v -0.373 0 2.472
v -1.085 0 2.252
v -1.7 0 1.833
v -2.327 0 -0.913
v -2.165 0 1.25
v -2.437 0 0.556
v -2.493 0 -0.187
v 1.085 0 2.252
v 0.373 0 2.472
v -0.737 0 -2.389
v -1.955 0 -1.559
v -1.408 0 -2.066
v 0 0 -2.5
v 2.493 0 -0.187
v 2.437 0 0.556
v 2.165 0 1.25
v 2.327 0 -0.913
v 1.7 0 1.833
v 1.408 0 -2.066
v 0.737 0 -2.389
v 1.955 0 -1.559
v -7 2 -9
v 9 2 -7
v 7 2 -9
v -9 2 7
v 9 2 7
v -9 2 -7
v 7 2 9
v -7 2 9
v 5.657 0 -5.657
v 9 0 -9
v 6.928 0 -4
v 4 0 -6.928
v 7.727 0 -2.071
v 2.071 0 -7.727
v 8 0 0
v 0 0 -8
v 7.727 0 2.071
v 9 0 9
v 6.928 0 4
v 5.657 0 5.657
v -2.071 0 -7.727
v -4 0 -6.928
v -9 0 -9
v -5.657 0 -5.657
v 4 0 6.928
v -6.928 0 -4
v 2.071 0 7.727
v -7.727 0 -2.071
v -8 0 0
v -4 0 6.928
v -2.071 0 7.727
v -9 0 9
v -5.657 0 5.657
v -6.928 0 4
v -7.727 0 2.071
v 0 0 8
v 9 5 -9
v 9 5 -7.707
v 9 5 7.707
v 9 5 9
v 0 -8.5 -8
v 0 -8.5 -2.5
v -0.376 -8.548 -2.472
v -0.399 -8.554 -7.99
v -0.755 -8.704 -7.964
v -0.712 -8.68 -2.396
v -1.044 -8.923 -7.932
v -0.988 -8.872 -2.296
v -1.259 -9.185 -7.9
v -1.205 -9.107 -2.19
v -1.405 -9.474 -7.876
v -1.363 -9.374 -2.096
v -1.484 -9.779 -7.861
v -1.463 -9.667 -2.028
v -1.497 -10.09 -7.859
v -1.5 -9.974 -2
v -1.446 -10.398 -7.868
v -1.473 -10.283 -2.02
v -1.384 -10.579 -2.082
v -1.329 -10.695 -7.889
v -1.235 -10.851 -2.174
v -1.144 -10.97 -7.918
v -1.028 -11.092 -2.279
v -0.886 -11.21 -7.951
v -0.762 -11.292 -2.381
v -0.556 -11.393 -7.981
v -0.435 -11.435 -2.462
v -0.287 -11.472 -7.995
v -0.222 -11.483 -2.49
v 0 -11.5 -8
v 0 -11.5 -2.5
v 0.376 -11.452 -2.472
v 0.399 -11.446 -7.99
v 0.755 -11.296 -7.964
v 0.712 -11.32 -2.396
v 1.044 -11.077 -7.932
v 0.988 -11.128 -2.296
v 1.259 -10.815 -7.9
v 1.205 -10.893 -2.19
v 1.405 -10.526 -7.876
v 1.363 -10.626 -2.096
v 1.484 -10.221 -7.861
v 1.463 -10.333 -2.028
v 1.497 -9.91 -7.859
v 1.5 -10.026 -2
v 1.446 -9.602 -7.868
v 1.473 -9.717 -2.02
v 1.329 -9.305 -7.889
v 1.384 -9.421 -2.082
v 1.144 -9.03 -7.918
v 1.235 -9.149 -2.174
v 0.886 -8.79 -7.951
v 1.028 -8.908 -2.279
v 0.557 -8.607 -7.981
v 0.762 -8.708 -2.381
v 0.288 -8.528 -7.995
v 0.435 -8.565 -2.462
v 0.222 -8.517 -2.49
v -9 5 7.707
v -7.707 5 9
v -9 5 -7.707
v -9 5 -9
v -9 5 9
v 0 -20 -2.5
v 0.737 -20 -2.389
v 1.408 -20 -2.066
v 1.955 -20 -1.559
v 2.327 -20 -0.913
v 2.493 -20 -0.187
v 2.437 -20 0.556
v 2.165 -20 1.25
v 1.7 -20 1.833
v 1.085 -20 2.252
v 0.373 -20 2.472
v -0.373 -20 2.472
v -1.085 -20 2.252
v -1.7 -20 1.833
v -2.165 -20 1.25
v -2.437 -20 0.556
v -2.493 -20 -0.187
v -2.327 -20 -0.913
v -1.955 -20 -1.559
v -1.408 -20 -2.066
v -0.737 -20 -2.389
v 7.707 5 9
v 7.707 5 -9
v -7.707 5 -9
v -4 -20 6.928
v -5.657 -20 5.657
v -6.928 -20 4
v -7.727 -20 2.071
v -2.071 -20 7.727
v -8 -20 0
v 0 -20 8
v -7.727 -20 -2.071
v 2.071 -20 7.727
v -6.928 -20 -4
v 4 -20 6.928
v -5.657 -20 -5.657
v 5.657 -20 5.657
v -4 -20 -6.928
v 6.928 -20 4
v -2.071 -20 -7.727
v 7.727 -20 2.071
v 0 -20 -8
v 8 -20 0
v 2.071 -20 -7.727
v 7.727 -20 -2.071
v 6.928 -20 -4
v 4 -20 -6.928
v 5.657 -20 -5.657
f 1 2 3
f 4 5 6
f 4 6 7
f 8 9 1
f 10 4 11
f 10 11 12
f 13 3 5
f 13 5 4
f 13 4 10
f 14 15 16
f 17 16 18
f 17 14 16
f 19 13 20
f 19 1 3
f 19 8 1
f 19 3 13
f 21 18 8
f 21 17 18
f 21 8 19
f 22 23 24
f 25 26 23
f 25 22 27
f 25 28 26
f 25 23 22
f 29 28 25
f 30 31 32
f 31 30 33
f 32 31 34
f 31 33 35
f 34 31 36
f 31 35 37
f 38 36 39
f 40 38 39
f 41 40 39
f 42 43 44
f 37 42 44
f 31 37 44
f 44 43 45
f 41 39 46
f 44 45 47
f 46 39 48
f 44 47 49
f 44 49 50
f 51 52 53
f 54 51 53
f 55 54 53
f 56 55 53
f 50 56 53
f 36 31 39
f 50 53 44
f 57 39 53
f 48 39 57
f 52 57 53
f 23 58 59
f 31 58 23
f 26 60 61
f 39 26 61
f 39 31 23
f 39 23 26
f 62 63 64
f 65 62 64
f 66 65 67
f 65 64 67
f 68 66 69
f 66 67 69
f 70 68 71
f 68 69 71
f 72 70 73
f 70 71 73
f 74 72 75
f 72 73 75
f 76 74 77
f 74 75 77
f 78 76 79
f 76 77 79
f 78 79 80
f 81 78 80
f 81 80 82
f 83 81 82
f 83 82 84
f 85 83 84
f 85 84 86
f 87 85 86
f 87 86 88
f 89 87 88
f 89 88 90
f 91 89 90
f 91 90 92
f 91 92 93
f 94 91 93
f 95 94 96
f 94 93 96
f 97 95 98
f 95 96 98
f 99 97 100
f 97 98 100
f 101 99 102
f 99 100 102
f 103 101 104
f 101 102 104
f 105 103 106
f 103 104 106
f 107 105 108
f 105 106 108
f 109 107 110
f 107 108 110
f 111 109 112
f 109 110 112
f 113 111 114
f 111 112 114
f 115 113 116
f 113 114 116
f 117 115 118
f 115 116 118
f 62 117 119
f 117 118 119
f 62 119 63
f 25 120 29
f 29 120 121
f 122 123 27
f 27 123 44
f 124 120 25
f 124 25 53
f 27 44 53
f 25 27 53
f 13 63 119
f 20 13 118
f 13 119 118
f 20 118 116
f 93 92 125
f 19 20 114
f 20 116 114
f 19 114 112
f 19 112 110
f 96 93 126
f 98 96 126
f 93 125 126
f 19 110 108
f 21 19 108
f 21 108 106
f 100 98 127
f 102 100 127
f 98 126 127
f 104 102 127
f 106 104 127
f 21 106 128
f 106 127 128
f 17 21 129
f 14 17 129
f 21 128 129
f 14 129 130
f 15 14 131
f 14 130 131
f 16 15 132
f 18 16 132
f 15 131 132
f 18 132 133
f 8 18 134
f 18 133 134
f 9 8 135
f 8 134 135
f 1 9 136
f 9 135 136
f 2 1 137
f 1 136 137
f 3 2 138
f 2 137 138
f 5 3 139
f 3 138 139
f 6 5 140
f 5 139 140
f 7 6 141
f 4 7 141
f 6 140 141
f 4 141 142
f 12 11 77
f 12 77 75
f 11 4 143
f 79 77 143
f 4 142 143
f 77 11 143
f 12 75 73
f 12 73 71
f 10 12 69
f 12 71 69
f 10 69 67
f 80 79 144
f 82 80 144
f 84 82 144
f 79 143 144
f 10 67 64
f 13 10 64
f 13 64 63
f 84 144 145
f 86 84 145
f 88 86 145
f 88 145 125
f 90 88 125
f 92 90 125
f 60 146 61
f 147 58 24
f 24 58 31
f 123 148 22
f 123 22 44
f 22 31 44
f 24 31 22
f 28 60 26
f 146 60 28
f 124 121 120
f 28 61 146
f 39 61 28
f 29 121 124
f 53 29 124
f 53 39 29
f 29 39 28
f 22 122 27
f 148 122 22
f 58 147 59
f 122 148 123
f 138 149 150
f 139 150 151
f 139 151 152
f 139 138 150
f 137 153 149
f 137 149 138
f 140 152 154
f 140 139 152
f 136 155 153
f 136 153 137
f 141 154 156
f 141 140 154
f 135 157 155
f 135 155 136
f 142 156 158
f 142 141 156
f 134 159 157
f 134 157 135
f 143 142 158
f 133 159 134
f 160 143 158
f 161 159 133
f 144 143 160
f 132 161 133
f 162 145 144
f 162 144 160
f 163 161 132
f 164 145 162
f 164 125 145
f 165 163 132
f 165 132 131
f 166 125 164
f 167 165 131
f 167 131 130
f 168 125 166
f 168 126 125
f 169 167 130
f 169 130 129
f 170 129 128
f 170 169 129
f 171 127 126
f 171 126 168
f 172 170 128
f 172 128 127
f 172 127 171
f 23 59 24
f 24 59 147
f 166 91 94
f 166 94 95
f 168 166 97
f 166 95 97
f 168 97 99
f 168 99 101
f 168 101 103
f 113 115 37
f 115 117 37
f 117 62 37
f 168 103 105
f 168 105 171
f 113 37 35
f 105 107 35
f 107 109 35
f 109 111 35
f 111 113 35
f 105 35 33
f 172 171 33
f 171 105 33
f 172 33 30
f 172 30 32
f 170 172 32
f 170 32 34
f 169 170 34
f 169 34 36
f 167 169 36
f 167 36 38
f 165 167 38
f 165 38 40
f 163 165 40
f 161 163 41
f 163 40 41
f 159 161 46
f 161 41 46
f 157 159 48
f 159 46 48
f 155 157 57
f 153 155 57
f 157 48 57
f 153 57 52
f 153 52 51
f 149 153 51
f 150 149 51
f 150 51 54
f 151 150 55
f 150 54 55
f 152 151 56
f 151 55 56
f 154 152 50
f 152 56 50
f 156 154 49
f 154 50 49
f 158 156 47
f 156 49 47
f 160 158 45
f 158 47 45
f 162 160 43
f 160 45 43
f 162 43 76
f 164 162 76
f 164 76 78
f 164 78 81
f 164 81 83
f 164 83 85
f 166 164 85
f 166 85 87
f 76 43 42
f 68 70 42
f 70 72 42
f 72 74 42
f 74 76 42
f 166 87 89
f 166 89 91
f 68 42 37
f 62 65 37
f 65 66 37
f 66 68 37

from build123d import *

# Parameters (mm, degrees)
SKETCH1_W           = 18
SKETCH1_H           = 18
BOSS_EXTRUDE1_DEPTH = 2
BOSS_EXTRUDE2_DEPTH = 3
CUT_EXTRUDE4_DEPTH  = 3
SKETCH5_R           = 8
BOSS_EXTRUDE3_DEPTH = 20
SKETCH6_R           = 2.5
CUT_EXTRUDE5_DEPTH  = 20
SKETCH7_R           = 1.5
CUT_EXTRUDE6_DEPTH  = 20


# Read off the part's stored shape, not the designer's step: Mirror1, Mirror2
with BuildPart() as part:
    # Sketch1 → Boss-Extrude1 (new body)
    with BuildSketch(Plane(origin=(0, 0, 0), x_dir=(1, 0, 0), z_dir=(0, 1, 0))):
        Rectangle(SKETCH1_W, SKETCH1_H)
    extrude(amount=BOSS_EXTRUDE1_DEPTH)

    # Sketch2 → Boss-Extrude2 (add)
    with BuildSketch(Plane(origin=(0, 2, 0), x_dir=(1, 0, 0), z_dir=(0, 1, 0))):
        Polygon((-9, 9), (-7, 9), (-9, 7), align=None)
        Polygon((9, 7), (9, 9), (7, 9), align=None)
        Polygon((7, -9), (9, -7), (9, -9), align=None)
        Polygon((-9, -7), (-9, -9), (-7, -9), align=None)
    extrude(amount=BOSS_EXTRUDE2_DEPTH)

    # Sketch4 → Cut-Extrude4 (cut)
    with BuildSketch(Plane(origin=(-7.554451855, -1.780601378, -7.554451855), x_dir=(0.7165985720844784, -0.16001422411879979, -0.678882857764243), z_dir=(0.697485832462916, 0.16439898730535757, 0.6974858324629155))):
        Polygon((-2.017235593, 6.634774192), (-2.017235593, 3.552567191), (0.773727267, 4.011398658), (-0.213027115, 6.931384239), align=None)
    extrude(amount=CUT_EXTRUDE4_DEPTH, mode=Mode.SUBTRACT)


with BuildPart() as cut_extrude4_kept_piece:
    # of the separate pieces the step leaves, the one the design keeps (cut_extrude4_pieces_kept)
    add(part.part.solids().sort_by_distance((-9, 0, -9))[0])

    # Mirror1
    split(bisect_by=Plane(origin=(0, 0, 0), x_dir=(0, 0, 1), z_dir=(1, 0, 0)), keep=Keep.BOTTOM)

    # Mirror1 2: Cut-Extrude4 kept piece across plane


with BuildPart() as cut_extrude4_kept_piece_1:
    add(cut_extrude4_kept_piece.part)
    add(cut_extrude4_kept_piece.part.mirror(Plane(origin=(0, 0, 0), x_dir=(0, 0, 1), z_dir=(1, 0, 0))))

    # Mirror2
    split(bisect_by=Plane.XY, keep=Keep.BOTTOM)

    # Mirror2 2: Cut-Extrude4 kept piece across plane


with BuildPart() as cut_extrude4_kept_piece_2:
    add(cut_extrude4_kept_piece_1.part)
    add(cut_extrude4_kept_piece_1.part.mirror(Plane.XY))

    # Sketch5 → Boss-Extrude3 (add)
    with BuildSketch(Plane.XZ):
        with Locations(Location((0, 0, 0), (0, 0, 270))):
            Circle(SKETCH5_R)
    extrude(amount=BOSS_EXTRUDE3_DEPTH)

    # Sketch6 → Cut-Extrude5 (cut)
    with BuildSketch(Plane.XZ.offset(20)):
        with Locations(Location((0, 0, 0), (0, 0, 270))):
            Circle(SKETCH6_R)
    extrude(amount=-CUT_EXTRUDE5_DEPTH, mode=Mode.SUBTRACT)

    # Sketch7 → Cut-Extrude6 (cut)
    with BuildSketch(Plane.XY):
        with Locations(Location((0, -10, 0), (0, 0, 90))):
            Circle(SKETCH7_R)
    extrude(amount=-CUT_EXTRUDE6_DEPTH, mode=Mode.SUBTRACT)


solid = cut_extrude4_kept_piece_2.part
